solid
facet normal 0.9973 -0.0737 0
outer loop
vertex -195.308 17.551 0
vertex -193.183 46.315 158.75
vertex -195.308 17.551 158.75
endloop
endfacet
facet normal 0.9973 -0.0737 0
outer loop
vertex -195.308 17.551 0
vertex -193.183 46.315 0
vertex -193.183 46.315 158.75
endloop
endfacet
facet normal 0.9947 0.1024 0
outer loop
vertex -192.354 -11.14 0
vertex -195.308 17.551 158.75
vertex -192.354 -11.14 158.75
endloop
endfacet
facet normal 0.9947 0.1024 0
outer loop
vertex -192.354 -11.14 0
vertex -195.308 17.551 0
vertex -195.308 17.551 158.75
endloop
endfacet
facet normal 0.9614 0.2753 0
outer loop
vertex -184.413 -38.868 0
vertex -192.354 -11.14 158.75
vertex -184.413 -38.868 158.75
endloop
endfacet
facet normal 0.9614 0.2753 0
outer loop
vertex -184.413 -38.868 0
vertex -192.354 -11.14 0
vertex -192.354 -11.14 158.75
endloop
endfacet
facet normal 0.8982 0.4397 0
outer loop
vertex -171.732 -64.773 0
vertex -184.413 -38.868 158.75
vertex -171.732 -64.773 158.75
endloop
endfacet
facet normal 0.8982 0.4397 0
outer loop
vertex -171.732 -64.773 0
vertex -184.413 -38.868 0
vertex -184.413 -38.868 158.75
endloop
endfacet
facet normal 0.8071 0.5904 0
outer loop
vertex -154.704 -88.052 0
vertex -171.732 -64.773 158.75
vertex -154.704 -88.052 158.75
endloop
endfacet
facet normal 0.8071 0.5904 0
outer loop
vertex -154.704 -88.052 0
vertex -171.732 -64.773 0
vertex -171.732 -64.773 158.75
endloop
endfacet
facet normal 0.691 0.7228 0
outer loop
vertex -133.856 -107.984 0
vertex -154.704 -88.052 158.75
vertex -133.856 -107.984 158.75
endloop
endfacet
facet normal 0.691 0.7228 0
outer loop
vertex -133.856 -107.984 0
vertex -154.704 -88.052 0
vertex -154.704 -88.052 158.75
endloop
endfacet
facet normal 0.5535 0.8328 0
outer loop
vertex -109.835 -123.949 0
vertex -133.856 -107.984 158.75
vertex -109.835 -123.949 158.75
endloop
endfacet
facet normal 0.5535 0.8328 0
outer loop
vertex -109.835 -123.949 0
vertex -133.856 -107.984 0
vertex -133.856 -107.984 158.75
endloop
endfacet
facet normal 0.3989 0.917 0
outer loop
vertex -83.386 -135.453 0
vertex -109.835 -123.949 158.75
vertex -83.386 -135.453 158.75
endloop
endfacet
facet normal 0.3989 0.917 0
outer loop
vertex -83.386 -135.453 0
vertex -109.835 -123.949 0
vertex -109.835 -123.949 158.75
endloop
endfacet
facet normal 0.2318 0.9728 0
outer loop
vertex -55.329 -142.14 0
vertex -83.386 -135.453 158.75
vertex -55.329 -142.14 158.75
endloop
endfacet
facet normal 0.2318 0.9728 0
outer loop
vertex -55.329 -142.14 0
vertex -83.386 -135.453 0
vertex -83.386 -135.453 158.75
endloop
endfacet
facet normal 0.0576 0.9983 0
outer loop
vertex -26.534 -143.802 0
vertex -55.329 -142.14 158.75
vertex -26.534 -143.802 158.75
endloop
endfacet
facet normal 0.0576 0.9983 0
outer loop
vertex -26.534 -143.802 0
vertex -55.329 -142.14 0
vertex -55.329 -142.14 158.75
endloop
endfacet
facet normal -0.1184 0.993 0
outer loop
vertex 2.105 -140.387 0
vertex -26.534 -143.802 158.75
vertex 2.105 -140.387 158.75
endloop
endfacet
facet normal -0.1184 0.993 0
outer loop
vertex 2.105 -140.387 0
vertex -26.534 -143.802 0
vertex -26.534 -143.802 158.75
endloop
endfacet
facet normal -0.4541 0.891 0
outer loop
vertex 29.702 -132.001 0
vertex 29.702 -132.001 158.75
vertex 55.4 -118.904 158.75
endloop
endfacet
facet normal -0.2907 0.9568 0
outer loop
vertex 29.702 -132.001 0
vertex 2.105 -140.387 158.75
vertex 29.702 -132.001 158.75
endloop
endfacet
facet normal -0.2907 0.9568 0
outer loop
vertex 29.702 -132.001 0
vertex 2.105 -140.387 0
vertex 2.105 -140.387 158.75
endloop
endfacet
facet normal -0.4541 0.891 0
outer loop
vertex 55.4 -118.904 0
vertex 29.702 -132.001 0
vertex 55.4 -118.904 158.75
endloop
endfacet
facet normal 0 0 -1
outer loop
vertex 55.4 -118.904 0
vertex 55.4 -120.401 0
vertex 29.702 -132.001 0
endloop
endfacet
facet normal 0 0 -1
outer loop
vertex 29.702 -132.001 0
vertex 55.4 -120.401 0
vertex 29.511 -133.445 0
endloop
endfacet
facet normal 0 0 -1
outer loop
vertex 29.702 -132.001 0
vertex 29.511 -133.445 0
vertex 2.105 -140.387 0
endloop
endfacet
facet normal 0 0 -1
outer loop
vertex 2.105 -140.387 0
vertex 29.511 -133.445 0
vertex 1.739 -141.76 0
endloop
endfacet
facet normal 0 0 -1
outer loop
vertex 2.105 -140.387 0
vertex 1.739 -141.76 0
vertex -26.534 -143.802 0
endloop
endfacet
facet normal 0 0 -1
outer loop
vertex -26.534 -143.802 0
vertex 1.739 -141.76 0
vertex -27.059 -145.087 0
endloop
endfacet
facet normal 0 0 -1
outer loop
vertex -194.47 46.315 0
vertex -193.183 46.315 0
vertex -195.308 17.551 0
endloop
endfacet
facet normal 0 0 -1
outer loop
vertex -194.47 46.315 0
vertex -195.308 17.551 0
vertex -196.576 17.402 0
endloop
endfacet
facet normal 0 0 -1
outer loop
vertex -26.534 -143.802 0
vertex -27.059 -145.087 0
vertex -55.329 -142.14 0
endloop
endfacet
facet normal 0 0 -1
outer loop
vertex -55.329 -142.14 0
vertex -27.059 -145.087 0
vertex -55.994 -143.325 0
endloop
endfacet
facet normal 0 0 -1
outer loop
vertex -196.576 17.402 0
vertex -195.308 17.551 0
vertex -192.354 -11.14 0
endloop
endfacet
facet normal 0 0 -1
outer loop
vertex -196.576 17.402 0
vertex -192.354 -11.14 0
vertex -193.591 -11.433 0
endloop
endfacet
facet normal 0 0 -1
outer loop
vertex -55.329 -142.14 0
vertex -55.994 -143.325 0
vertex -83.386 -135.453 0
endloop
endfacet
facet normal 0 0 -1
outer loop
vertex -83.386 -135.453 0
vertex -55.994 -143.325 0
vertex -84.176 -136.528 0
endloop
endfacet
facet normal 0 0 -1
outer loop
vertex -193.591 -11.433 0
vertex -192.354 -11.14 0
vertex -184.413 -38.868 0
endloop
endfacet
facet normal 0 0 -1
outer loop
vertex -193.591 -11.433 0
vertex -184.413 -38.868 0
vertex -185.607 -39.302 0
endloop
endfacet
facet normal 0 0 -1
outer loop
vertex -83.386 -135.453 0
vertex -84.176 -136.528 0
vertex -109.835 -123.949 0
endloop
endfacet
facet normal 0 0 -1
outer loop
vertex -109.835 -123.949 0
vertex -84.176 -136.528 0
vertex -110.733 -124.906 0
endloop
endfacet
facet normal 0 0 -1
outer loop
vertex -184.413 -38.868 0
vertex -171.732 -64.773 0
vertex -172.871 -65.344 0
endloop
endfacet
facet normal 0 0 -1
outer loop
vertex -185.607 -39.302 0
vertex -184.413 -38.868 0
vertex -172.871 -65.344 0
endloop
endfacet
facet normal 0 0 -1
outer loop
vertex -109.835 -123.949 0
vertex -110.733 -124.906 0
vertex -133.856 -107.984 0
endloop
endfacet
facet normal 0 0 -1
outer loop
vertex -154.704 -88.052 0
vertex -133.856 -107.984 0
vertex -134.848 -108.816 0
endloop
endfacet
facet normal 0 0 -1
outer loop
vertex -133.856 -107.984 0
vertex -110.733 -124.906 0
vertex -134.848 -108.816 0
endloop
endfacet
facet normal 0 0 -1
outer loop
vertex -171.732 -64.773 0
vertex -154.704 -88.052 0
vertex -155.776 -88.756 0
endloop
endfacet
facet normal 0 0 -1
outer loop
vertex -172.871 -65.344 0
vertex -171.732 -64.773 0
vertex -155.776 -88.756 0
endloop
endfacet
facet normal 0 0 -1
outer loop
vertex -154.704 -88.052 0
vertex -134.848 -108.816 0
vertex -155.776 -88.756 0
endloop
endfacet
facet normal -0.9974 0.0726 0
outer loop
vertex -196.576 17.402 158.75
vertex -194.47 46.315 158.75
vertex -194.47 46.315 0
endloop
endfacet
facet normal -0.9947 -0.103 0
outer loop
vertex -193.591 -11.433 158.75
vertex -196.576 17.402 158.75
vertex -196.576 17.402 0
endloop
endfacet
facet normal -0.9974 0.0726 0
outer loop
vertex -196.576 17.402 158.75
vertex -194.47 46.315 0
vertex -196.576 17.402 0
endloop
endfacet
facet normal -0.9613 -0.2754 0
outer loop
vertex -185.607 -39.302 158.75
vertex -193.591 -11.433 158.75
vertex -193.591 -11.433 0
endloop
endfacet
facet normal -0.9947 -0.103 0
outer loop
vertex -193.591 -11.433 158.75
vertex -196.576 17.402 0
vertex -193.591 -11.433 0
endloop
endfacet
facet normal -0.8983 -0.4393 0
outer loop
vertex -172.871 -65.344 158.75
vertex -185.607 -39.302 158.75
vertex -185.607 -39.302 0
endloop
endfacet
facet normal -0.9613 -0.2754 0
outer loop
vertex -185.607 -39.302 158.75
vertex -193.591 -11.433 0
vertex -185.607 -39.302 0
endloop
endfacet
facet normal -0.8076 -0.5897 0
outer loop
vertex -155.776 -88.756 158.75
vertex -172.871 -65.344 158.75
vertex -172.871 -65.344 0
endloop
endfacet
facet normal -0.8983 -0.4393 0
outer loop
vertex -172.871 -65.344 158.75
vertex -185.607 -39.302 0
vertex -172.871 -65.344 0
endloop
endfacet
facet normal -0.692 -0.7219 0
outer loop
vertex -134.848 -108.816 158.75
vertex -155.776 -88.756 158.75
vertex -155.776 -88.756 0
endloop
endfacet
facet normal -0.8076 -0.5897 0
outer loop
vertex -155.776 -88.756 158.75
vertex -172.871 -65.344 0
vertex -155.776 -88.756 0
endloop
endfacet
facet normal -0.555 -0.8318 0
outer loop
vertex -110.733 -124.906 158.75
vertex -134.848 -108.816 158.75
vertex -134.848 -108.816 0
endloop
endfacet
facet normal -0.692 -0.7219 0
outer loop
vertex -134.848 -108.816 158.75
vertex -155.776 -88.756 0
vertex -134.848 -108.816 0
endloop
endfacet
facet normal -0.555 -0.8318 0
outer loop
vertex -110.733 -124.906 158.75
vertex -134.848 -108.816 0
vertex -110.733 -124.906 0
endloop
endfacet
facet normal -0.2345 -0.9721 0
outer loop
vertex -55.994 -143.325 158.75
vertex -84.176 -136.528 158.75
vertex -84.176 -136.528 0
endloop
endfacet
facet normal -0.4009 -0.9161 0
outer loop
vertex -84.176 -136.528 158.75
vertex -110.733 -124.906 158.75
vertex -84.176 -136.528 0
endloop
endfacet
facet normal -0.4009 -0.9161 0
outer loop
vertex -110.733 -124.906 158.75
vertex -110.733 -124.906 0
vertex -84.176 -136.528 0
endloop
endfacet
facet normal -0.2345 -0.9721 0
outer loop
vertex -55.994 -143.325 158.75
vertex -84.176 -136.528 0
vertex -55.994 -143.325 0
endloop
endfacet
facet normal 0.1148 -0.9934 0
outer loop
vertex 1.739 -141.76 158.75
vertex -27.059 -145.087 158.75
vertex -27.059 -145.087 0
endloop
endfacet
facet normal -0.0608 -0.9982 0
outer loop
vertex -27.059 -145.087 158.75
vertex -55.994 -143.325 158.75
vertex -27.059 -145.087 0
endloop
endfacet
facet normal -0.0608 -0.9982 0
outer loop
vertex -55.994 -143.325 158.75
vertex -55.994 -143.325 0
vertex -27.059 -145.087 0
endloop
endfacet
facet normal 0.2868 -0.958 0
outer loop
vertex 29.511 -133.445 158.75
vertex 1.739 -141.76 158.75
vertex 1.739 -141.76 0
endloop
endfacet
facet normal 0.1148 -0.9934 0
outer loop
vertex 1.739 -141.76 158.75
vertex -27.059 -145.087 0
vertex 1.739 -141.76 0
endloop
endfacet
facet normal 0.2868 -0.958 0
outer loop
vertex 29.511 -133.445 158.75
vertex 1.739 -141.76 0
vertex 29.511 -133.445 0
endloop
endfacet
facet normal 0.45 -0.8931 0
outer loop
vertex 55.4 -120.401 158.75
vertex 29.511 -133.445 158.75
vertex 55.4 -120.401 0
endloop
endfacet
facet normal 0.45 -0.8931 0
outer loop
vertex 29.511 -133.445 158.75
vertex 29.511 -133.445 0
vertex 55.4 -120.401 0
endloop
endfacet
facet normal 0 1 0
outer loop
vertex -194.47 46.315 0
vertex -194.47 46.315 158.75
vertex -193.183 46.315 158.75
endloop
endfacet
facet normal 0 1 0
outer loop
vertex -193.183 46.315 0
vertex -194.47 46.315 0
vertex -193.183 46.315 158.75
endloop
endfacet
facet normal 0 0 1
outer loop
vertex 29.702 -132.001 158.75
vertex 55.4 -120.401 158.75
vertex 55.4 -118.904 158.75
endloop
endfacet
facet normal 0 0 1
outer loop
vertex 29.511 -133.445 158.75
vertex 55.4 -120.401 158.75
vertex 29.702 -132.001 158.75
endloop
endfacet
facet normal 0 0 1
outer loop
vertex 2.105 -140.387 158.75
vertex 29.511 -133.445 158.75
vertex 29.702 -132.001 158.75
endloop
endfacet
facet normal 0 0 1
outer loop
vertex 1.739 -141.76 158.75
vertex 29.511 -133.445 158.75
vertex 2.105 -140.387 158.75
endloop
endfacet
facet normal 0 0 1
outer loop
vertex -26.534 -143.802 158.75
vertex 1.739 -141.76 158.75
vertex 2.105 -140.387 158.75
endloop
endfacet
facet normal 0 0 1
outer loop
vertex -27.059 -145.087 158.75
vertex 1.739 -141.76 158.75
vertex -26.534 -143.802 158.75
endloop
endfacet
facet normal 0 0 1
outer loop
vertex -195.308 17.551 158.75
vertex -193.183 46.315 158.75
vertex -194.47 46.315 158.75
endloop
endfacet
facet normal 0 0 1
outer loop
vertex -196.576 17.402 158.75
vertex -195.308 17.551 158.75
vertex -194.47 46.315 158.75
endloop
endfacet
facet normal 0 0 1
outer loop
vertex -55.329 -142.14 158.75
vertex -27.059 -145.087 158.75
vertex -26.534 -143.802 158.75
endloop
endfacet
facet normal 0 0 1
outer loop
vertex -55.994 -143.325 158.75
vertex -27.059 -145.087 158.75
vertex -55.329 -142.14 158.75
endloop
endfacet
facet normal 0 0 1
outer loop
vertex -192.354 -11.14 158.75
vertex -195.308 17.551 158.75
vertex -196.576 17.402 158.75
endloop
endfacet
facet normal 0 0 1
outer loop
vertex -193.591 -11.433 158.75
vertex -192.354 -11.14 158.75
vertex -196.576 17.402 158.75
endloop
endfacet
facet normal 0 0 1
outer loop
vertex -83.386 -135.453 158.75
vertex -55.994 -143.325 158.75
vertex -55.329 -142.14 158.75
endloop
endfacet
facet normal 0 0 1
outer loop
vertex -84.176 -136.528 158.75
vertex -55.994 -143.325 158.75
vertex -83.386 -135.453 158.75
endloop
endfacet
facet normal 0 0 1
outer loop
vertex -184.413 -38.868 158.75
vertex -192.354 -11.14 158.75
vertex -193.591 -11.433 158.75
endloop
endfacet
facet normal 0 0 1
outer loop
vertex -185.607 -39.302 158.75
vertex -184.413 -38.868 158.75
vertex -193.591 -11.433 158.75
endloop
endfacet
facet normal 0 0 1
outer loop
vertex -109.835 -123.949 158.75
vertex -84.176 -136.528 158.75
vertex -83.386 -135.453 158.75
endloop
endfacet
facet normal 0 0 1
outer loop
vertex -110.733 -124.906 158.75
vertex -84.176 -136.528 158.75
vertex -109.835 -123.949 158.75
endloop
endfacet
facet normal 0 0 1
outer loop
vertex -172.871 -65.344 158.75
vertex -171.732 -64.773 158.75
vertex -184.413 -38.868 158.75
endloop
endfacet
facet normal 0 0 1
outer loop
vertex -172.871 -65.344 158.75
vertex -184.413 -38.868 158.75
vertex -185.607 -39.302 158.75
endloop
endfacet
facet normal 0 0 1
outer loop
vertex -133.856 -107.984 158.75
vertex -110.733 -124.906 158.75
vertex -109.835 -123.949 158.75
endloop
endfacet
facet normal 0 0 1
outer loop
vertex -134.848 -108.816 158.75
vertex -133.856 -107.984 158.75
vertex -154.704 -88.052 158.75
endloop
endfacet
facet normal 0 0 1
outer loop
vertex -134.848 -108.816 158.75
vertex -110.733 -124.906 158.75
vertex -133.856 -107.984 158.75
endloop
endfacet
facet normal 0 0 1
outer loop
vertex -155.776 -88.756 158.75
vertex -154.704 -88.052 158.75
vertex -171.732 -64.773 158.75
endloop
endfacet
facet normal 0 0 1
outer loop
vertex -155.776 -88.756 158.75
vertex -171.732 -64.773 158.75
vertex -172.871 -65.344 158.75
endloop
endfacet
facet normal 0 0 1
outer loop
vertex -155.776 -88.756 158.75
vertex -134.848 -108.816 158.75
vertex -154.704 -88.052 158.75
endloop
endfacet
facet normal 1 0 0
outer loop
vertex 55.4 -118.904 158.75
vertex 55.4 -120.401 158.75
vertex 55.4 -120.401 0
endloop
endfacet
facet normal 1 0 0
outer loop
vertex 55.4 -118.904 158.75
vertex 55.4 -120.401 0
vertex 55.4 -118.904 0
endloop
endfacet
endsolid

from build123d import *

# Parameters (mm, degrees)
SKETCH1_R           = 165.062282849
BOSS_EXTRUDE1_DEPTH = 158.75
SHELL1_T            = -1.27
SKETCH2_W           = 163.144728945
SKETCH2_H           = 394.61311295
CUT_EXTRUDE2_DEPTH  = 158.75
SKETCH3_W           = 362.622399732
SKETCH3_H           = 160.71006498
CUT_EXTRUDE3_DEPTH  = 158.75


with BuildPart() as part:
    # Sketch1 → Boss-Extrude1 (new body)
    with BuildSketch(Plane.XY):
        with Locations(Location((-31.532687059, 19.91445928, 0), (0, 0, 180))):
            Circle(SKETCH1_R)
    extrude(amount=BOSS_EXTRUDE1_DEPTH)

    # Shell1
    shell1_openings = [part.faces().sort_by_distance(p)[0] for p in [
        (-31.532687059, 19.91445928, 158.75),
        (-31.532687059, 19.91445928, 0),
    ]]
    offset(amount=SHELL1_T, openings=shell1_openings, kind=Kind.INTERSECTION)

    # Sketch2 → Cut-Extrude2 (cut)
    with BuildSketch(Plane.XY.offset(158.75)):
        with Locations((136.971926827, 42.916431228)):
            Rectangle(SKETCH2_W, SKETCH2_H)
    extrude(amount=-CUT_EXTRUDE2_DEPTH, mode=Mode.SUBTRACT)

    # Sketch3 → Cut-Extrude3 (cut)
    with BuildSketch(Plane.XY.offset(158.75)):
        with Locations((-34.997933009, 126.669881209)):
            Rectangle(SKETCH3_W, SKETCH3_H)
    extrude(amount=-CUT_EXTRUDE3_DEPTH, mode=Mode.SUBTRACT)


solid = part.part
